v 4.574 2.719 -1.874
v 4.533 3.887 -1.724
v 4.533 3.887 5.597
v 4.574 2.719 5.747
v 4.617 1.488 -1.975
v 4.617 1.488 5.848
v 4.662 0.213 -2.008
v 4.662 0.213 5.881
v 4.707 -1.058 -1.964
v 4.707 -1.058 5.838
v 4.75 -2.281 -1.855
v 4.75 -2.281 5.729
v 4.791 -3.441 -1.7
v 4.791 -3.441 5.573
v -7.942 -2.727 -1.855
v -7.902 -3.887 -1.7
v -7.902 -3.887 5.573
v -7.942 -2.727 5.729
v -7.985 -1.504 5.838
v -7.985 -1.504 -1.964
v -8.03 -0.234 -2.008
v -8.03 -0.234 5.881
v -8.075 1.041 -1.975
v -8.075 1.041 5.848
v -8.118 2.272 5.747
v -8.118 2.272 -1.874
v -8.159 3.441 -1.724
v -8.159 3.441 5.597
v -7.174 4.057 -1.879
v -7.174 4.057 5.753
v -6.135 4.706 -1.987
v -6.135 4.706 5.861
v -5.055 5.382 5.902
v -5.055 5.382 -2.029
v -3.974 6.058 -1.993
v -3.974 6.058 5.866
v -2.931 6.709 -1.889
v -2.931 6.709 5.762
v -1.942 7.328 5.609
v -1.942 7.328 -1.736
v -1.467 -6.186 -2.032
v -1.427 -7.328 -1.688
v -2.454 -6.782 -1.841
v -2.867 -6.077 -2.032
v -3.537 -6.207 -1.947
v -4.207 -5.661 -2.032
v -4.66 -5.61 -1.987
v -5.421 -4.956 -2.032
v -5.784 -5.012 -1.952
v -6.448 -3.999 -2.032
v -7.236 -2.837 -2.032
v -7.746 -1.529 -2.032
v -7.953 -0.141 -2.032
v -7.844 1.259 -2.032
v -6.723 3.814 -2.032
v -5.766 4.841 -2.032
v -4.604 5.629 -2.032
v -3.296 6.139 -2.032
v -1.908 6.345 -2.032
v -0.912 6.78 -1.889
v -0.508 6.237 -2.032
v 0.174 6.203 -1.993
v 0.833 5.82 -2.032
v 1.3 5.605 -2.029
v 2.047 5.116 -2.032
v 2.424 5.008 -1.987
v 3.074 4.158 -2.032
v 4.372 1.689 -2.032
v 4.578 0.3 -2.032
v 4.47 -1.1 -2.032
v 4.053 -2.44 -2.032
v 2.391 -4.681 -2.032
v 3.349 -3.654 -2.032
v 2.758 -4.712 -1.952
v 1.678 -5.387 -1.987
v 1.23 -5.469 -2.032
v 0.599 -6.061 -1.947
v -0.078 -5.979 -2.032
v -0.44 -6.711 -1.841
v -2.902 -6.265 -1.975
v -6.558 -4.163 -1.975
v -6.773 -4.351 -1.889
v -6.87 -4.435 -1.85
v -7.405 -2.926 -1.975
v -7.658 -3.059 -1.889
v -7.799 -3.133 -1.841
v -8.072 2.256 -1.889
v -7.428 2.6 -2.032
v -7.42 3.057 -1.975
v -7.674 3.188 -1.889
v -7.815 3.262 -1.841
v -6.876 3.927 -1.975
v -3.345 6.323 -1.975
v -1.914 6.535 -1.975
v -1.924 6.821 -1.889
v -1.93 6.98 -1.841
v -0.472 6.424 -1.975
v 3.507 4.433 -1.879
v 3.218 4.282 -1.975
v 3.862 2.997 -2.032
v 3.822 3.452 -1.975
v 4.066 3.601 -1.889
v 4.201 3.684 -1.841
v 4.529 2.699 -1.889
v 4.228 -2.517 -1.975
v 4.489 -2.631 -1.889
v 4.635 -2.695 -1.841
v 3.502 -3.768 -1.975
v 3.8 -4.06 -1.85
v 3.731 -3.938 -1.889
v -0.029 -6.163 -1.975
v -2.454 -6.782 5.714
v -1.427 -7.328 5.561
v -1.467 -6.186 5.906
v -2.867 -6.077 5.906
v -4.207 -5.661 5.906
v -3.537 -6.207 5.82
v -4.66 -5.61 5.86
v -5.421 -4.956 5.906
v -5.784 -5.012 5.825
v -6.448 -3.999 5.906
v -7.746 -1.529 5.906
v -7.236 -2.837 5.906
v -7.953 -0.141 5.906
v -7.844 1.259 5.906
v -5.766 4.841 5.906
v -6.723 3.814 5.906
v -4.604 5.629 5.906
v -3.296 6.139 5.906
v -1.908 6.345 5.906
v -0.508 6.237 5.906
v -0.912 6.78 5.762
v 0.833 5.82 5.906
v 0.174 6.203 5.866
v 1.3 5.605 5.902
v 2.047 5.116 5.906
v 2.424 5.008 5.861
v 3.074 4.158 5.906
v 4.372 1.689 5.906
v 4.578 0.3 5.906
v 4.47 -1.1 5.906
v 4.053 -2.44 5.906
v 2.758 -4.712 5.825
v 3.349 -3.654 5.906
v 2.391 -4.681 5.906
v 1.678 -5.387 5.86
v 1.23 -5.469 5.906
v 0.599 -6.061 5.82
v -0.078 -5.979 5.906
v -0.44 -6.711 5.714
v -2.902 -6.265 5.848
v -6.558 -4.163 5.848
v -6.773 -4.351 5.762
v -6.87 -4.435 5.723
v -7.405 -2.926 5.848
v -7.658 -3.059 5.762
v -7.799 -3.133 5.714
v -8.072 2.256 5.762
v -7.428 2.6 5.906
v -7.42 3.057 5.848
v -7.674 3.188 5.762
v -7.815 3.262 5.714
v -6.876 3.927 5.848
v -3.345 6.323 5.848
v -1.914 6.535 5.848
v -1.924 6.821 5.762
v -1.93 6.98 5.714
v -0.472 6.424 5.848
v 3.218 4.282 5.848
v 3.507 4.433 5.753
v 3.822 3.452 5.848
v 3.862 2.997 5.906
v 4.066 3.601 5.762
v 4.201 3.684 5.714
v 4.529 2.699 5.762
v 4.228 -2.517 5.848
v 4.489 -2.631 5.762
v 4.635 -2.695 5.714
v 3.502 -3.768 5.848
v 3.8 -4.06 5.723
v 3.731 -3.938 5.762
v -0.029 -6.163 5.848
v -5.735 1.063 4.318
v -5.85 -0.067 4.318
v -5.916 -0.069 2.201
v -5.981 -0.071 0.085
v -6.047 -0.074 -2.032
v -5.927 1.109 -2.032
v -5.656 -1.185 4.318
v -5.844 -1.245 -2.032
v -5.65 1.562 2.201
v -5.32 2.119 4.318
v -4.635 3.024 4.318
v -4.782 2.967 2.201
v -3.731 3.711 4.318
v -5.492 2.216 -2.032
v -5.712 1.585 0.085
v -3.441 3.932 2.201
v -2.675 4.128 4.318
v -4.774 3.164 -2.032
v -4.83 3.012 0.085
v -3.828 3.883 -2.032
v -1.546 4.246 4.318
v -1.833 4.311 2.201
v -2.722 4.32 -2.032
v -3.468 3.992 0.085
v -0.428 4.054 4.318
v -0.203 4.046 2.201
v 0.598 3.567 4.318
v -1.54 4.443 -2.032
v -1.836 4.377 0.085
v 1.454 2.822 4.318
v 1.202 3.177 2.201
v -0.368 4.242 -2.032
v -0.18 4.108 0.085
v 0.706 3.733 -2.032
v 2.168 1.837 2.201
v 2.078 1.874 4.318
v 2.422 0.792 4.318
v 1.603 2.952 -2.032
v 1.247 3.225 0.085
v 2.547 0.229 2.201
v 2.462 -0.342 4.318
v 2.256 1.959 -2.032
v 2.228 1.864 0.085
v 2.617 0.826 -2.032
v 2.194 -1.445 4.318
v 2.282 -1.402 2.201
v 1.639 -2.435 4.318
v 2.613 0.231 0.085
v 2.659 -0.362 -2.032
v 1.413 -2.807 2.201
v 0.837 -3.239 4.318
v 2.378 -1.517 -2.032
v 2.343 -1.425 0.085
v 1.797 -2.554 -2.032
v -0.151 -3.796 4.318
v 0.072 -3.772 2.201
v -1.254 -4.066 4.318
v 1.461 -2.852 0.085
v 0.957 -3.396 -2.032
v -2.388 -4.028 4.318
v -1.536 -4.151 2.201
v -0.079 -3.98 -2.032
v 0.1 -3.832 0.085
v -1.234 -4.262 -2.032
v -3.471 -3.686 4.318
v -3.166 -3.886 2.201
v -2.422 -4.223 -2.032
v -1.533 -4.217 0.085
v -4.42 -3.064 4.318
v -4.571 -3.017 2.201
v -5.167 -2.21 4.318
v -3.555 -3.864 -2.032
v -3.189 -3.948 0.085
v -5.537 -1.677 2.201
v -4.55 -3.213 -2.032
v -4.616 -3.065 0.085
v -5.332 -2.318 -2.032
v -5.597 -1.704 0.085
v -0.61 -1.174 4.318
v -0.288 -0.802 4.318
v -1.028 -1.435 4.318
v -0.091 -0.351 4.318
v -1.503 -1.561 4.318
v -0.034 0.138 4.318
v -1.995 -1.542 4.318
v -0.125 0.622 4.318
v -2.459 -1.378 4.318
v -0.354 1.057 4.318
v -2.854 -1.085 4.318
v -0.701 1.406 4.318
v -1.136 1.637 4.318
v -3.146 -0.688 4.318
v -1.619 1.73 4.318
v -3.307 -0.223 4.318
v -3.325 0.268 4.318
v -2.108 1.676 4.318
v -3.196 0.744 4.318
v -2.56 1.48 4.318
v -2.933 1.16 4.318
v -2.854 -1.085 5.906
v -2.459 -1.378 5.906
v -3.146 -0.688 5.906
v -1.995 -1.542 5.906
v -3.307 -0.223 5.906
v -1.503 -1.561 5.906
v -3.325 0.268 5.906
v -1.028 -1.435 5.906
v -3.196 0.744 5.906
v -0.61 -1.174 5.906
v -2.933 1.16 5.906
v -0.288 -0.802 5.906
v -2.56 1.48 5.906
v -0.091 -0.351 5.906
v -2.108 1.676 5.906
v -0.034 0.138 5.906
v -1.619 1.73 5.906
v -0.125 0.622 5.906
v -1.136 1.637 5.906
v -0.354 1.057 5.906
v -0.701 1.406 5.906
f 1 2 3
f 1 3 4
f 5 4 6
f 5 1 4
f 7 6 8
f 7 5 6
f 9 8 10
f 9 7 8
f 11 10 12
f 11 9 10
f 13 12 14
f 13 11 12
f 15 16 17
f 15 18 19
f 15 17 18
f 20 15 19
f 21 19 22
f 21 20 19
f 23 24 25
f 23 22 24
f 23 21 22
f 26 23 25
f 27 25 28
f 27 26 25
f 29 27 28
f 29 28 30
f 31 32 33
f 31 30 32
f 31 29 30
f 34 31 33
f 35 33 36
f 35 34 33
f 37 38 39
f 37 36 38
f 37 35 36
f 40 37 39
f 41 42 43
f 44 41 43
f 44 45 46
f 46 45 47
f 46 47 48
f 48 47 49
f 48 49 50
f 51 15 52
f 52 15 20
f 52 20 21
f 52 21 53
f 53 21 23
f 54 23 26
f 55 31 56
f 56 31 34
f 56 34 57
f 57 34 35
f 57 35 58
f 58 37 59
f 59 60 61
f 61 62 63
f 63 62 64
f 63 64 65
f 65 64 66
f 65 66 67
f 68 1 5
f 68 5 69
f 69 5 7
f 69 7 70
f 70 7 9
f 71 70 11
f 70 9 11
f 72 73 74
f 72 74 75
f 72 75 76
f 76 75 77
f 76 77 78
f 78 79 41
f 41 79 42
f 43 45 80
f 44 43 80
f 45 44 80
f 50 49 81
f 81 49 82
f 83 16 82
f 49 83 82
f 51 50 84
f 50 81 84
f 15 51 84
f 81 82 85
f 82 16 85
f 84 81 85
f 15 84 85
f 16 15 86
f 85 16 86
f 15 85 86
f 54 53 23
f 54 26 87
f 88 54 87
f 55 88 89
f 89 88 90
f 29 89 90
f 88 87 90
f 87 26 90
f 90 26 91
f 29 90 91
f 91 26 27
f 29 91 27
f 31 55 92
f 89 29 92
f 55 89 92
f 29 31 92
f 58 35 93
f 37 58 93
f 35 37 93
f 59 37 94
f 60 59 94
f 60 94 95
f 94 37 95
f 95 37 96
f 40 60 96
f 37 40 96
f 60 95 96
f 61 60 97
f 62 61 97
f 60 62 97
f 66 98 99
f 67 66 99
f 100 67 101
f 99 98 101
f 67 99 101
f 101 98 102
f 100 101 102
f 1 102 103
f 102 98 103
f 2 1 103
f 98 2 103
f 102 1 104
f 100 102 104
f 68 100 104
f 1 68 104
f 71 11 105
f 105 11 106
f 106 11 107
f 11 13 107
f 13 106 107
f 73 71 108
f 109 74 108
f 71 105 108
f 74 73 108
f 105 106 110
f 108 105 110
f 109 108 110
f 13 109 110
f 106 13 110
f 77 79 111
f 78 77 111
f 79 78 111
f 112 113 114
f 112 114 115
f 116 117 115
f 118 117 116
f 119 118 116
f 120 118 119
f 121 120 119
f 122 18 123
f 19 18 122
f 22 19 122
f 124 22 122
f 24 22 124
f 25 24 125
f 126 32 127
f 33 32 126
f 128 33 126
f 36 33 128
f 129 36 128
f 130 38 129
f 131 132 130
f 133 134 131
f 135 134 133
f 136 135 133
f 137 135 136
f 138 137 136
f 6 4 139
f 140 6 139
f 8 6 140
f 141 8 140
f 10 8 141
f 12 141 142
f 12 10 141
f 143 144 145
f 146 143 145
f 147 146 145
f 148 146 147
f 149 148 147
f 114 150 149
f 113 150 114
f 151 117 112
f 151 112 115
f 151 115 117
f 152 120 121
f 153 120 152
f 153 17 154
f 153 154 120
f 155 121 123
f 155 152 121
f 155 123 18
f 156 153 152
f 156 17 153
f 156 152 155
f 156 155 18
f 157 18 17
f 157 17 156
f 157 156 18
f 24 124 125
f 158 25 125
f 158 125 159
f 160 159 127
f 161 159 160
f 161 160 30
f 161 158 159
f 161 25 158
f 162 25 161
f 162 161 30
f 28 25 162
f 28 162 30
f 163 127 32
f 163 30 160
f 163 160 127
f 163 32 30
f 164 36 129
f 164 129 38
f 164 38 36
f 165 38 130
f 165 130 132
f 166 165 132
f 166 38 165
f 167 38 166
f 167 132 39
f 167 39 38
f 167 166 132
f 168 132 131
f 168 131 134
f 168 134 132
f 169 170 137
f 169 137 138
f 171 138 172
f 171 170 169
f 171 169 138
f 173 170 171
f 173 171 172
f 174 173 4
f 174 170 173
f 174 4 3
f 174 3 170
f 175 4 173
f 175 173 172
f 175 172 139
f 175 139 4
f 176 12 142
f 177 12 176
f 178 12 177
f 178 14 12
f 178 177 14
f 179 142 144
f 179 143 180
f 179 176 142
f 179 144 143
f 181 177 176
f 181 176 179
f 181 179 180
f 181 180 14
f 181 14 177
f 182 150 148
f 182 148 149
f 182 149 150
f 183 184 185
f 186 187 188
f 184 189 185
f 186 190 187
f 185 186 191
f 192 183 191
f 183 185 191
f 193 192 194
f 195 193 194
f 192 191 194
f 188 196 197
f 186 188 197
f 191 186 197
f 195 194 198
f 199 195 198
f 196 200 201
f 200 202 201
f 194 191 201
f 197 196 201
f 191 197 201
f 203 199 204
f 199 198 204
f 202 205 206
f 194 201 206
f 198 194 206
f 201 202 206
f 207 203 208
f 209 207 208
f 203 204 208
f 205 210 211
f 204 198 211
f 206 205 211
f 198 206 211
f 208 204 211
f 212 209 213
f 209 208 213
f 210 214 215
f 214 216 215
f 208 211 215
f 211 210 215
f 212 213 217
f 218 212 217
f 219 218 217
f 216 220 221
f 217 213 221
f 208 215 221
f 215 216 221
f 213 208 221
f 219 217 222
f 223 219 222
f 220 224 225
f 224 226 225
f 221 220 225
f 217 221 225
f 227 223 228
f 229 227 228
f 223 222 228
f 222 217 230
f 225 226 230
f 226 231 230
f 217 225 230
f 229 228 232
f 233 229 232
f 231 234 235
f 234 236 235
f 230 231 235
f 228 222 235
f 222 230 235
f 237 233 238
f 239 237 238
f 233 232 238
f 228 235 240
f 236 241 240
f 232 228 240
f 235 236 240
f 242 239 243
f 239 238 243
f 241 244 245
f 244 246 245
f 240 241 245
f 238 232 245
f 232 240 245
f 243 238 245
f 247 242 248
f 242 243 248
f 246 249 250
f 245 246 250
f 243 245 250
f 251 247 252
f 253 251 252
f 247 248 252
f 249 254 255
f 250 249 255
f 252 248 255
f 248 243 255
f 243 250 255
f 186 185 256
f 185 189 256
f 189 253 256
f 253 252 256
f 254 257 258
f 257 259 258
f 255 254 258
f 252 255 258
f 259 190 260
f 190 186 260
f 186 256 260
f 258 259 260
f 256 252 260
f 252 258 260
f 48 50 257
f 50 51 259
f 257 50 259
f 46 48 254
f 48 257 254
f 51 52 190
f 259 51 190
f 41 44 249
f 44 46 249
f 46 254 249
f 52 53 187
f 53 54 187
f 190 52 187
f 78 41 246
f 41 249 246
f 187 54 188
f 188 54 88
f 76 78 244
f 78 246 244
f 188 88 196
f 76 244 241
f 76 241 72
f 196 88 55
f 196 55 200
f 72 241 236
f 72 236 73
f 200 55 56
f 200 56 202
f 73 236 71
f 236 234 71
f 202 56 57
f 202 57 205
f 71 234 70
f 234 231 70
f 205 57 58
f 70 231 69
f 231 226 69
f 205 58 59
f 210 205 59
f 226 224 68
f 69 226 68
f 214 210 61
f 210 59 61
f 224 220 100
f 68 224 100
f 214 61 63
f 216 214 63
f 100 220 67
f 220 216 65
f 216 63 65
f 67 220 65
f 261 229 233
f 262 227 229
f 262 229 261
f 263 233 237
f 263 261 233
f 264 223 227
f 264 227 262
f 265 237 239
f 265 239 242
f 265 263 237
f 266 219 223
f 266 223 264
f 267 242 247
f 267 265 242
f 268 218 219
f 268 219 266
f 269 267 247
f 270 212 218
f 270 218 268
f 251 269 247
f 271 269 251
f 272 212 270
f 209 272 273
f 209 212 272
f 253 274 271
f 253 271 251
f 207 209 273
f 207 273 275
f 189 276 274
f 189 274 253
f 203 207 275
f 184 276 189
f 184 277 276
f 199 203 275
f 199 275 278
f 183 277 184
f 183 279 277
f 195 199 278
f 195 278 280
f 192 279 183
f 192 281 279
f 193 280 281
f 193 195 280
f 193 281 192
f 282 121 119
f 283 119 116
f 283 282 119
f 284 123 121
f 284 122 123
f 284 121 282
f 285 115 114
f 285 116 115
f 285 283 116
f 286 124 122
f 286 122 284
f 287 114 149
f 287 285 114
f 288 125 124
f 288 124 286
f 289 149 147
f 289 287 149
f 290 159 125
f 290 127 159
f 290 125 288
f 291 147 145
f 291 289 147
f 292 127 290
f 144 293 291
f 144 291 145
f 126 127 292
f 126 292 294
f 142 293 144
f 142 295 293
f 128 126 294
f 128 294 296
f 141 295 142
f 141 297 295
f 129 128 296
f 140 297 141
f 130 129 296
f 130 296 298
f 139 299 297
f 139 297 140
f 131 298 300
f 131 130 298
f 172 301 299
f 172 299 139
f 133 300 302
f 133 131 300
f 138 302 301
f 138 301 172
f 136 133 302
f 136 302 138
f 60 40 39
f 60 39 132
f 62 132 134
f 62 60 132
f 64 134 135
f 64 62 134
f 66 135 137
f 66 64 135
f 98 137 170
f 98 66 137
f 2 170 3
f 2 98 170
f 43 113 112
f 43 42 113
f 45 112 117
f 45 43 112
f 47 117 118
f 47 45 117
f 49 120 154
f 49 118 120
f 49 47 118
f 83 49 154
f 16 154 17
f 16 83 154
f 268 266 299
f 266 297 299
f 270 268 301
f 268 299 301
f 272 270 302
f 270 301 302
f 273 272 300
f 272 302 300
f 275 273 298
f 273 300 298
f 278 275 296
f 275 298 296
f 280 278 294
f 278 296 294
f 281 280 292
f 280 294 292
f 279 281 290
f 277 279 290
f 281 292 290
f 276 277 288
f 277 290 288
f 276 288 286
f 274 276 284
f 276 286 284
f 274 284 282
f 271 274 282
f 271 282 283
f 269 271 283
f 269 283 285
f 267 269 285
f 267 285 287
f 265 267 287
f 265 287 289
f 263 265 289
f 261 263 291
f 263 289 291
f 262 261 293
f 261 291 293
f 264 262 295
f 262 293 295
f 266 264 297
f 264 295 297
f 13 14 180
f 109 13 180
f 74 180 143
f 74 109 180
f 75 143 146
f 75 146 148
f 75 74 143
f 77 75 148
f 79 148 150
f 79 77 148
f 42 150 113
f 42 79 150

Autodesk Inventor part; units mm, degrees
ref_plane "YZ Plane" through (0, 0, 0) normal (1, 0, 0) x (0, 1, 0)
ref_plane "XZ Plane" through (0, 0, 0) normal (0, 1, 0) x (-1, 0, 0)
ref_plane "Work Plane3" through (-1.6844, 0, -2.032) normal (0, 0, 1) x (0.9993818, 0.0351571, 0)
sketch "Sketch6" plane through (-1.6844, 0, -2.032) normal (0, 0, 1) x (0.9993818, 0.0351571, 0)
  circle A0 centre (0, 0) radius 6.35
  line L0 (0, 7.3323) -> (6.35, 3.6662)
  line L1 (6.35, 3.6662) -> (6.35, -3.6662)
  line L2 (6.35, -3.6662) -> (0, -7.3323)
  line L3 (0, -7.3323) -> (-6.35, -3.6662)
  line L4 (-6.35, -3.6662) -> (-6.35, 3.6662)
  line L5 (-6.35, 3.6662) -> (0, 7.3323)
  point P0 (1.6833, -0.0592)
  point P1 (0, 7.8524)
  dimension "d5" = 12.7
extrude "Extrusion2" add sketch "Sketch6" along normal blind 7.9375
sketch "Sketch7" plane through (-1.6844, 0, -2.032) normal (0, 0, -1) x (-0.9993818, -0.0351571, 0)
  circle A0 centre (-0.0028, 0.0799) radius 4.3656 projected
  point P0 (-1.6833, -0.0592)
extrude "Extrusion3" cut sketch "Sketch7" against normal blind 6.35 draft -1.783
sketch "Sketch8" plane through (-1.6844, 0, 5.9055) normal (0, 0, 1) x (0.9993818, 0.0351571, 0)
  circle A0 centre (0.0028, 0.0799) radius 1.651 projected
  point P0 (1.6833, -0.0592)
extrude "Extrusion4" cut sketch "Sketch8" against normal through all
thread "Thread1" size "1/8" designation "1/8 - 27 NPT" standard "NPT for PVC Pipe and Fitting" length 9.9568
ref_plane "Work Plane4" through (-1.9422, 7.3278, -2.032) normal (0.9993818, 0.0351571, 0) x (0, 0, 1)
sketch "Sketch9" plane through (-1.9422, 7.3278, -2.032) normal (0.9993818, 0.0351571, 0) x (0, 0, 1)
  line L0 (7.9375, 13.5217) -> (7.593, 14.6647)
  line L1 (7.593, 14.6647) -> (7.9375, 13.5217)
  line L2 (7.593, 14.6647) -> (7.9375, 14.6647)
  line L3 (7.9375, 14.6647) -> (7.9375, 13.5217)
  line L4 (9.525, 7.2525) -> (-1.5875, 7.2525) projected
  point P0 (2.032, 7.3916)
  dimension "d13" = 1.143
revolve "Revolution2" cut sketch "Sketch9" angle 360 about axis through (-1.6872, 0.0798, 5.9055) along (0, 0, -1)
ref_plane "Work Plane5" through (-1.6872, 0.0798, 1.9367) normal (0, 0, 1) x (1, 0, 0)
mirror "Mirror1" about plane through (-1.6872, 0.0798, 1.9367) normal (0, 0, 1) of "Revolution2"
properties part number "Pneumatics_VIAIR_Fitting_01"
